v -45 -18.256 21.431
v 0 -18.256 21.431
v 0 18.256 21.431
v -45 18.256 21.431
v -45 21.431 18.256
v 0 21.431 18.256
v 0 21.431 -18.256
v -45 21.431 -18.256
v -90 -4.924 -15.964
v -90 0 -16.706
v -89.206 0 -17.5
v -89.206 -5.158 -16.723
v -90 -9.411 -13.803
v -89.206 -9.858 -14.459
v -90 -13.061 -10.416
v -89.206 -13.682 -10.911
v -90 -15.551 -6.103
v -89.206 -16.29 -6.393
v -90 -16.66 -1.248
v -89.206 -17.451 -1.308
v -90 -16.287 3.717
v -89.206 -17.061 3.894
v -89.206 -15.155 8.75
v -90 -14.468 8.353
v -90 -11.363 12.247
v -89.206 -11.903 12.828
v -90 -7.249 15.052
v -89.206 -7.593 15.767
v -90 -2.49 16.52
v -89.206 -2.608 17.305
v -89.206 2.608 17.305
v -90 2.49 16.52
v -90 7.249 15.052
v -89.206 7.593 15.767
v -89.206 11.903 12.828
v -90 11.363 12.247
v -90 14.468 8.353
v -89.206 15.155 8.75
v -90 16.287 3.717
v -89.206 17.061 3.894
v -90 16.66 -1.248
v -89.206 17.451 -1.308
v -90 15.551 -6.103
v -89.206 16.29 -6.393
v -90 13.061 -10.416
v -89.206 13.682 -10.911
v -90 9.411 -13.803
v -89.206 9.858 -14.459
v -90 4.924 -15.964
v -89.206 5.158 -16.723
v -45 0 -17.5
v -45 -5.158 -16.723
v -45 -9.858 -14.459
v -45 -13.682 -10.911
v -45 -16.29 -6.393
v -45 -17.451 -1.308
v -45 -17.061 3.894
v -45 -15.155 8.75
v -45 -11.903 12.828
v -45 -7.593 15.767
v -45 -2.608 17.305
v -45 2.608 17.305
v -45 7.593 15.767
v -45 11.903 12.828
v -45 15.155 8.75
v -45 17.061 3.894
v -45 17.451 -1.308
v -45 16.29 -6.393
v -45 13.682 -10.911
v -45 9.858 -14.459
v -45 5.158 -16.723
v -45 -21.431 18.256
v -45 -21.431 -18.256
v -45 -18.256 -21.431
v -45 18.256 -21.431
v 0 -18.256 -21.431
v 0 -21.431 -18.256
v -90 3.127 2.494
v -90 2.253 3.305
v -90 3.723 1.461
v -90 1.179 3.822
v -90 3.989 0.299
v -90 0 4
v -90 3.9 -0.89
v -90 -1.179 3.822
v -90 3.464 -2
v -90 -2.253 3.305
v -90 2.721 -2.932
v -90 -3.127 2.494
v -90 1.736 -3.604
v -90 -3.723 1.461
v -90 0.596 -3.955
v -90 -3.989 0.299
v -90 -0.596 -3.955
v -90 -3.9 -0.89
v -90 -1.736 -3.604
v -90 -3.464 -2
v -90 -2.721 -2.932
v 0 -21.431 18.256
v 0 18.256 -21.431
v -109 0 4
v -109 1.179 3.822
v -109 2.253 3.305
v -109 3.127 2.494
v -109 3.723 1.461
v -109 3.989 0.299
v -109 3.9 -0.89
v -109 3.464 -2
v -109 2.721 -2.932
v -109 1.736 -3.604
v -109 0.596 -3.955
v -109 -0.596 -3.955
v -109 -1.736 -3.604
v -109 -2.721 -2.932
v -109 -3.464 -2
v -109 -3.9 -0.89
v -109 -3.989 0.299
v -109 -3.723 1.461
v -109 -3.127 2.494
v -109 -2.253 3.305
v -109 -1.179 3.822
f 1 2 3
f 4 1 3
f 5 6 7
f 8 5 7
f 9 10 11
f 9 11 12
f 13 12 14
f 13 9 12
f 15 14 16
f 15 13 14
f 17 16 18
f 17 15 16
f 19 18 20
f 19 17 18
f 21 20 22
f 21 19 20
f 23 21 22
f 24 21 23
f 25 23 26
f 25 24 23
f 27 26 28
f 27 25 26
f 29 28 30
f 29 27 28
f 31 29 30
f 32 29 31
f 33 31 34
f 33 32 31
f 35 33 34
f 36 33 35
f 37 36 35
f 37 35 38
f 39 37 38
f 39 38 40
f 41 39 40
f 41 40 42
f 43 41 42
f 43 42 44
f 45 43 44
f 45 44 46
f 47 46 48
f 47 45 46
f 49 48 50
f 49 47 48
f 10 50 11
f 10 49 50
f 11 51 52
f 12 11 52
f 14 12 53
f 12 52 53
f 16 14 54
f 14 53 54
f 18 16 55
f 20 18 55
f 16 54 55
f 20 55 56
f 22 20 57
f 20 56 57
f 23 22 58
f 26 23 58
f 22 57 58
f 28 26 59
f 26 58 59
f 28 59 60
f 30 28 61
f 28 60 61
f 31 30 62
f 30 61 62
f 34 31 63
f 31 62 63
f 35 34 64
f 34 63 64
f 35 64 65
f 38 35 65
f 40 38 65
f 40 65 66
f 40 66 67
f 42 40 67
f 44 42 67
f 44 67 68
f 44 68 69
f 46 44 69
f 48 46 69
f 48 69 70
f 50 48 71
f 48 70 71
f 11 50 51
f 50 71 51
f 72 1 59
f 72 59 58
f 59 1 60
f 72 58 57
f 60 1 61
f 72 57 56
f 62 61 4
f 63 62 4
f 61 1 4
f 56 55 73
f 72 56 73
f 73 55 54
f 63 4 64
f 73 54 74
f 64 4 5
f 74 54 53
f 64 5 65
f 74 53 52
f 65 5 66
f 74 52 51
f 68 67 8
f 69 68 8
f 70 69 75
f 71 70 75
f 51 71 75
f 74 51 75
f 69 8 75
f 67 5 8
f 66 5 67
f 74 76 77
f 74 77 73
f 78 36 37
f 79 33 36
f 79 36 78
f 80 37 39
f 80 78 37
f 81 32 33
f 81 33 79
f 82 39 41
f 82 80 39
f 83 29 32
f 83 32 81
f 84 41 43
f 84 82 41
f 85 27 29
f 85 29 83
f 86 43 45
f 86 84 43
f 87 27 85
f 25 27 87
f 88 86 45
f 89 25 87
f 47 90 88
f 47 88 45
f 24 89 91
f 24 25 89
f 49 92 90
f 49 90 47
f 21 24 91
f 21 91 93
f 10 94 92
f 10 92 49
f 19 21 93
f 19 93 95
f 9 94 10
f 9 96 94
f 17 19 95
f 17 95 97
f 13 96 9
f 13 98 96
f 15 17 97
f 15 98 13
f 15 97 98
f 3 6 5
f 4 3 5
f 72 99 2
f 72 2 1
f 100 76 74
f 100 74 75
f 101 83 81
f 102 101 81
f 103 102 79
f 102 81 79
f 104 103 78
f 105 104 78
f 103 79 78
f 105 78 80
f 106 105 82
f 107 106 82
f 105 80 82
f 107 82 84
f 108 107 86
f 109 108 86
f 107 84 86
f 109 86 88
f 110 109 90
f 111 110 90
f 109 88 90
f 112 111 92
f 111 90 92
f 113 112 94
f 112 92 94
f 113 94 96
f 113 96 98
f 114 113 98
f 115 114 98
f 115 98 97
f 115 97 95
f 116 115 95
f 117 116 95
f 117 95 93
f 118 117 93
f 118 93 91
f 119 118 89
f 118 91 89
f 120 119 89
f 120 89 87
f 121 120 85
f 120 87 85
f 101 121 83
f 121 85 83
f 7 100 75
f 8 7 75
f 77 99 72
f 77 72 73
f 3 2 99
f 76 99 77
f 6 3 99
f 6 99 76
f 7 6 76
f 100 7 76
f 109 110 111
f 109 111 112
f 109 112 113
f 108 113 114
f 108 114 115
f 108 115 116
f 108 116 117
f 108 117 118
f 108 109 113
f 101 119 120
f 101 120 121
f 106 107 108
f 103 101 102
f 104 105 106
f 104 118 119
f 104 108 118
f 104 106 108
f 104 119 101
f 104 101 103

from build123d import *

# Parameters (mm, degrees)
SKETCH1_W           = 42.8625
SKETCH1_H           = 42.8625
BOSS_EXTRUDE1_DEPTH = 45
SKETCH4_R           = 17.5
BOSS_EXTRUDE2_DEPTH = 45
SKETCH5_R           = 4
BOSS_EXTRUDE3_DEPTH = 19
CHAMFER1_SIZE       = 3.175
CHAMFER2_SIZE       = 0.79375


with BuildPart() as part:
    # Sketch1 → Boss-Extrude1 (new body)
    with BuildSketch(Plane(origin=(0, 0, 0), x_dir=(0, 0, -1), z_dir=(1, 0, 0))):
        Rectangle(SKETCH1_W, SKETCH1_H)
    extrude(amount=-BOSS_EXTRUDE1_DEPTH)

    # Sketch4 → Boss-Extrude2 (add)
    with BuildSketch(Plane.ZY.offset(45)):
        with Locations(Location((0, 0, 0), (0, 0, 180))):
            Circle(SKETCH4_R)
    extrude(amount=BOSS_EXTRUDE2_DEPTH)

    # Sketch5 → Boss-Extrude3 (add)
    with BuildSketch(Plane.ZY.offset(90)):
        Circle(SKETCH5_R)
    extrude(amount=BOSS_EXTRUDE3_DEPTH)

    # Chamfer1
    chamfer1_edges = [part.edges().sort_by_distance(p)[0] for p in [
        (-22.5, -21.43125, -21.43125),
        (-22.5, -21.43125, 21.43125),
        (-22.5, 21.43125, 21.43125),
        (-22.5, 21.43125, -21.43125),
    ]]
    chamfer(chamfer1_edges, length=CHAMFER1_SIZE)

    # Chamfer2
    chamfer2_edges = [part.edges().sort_by_distance(p)[0] for p in [
        (-90, 0, 17.5),
    ]]
    chamfer(chamfer2_edges, length=CHAMFER2_SIZE)


solid = part.part
